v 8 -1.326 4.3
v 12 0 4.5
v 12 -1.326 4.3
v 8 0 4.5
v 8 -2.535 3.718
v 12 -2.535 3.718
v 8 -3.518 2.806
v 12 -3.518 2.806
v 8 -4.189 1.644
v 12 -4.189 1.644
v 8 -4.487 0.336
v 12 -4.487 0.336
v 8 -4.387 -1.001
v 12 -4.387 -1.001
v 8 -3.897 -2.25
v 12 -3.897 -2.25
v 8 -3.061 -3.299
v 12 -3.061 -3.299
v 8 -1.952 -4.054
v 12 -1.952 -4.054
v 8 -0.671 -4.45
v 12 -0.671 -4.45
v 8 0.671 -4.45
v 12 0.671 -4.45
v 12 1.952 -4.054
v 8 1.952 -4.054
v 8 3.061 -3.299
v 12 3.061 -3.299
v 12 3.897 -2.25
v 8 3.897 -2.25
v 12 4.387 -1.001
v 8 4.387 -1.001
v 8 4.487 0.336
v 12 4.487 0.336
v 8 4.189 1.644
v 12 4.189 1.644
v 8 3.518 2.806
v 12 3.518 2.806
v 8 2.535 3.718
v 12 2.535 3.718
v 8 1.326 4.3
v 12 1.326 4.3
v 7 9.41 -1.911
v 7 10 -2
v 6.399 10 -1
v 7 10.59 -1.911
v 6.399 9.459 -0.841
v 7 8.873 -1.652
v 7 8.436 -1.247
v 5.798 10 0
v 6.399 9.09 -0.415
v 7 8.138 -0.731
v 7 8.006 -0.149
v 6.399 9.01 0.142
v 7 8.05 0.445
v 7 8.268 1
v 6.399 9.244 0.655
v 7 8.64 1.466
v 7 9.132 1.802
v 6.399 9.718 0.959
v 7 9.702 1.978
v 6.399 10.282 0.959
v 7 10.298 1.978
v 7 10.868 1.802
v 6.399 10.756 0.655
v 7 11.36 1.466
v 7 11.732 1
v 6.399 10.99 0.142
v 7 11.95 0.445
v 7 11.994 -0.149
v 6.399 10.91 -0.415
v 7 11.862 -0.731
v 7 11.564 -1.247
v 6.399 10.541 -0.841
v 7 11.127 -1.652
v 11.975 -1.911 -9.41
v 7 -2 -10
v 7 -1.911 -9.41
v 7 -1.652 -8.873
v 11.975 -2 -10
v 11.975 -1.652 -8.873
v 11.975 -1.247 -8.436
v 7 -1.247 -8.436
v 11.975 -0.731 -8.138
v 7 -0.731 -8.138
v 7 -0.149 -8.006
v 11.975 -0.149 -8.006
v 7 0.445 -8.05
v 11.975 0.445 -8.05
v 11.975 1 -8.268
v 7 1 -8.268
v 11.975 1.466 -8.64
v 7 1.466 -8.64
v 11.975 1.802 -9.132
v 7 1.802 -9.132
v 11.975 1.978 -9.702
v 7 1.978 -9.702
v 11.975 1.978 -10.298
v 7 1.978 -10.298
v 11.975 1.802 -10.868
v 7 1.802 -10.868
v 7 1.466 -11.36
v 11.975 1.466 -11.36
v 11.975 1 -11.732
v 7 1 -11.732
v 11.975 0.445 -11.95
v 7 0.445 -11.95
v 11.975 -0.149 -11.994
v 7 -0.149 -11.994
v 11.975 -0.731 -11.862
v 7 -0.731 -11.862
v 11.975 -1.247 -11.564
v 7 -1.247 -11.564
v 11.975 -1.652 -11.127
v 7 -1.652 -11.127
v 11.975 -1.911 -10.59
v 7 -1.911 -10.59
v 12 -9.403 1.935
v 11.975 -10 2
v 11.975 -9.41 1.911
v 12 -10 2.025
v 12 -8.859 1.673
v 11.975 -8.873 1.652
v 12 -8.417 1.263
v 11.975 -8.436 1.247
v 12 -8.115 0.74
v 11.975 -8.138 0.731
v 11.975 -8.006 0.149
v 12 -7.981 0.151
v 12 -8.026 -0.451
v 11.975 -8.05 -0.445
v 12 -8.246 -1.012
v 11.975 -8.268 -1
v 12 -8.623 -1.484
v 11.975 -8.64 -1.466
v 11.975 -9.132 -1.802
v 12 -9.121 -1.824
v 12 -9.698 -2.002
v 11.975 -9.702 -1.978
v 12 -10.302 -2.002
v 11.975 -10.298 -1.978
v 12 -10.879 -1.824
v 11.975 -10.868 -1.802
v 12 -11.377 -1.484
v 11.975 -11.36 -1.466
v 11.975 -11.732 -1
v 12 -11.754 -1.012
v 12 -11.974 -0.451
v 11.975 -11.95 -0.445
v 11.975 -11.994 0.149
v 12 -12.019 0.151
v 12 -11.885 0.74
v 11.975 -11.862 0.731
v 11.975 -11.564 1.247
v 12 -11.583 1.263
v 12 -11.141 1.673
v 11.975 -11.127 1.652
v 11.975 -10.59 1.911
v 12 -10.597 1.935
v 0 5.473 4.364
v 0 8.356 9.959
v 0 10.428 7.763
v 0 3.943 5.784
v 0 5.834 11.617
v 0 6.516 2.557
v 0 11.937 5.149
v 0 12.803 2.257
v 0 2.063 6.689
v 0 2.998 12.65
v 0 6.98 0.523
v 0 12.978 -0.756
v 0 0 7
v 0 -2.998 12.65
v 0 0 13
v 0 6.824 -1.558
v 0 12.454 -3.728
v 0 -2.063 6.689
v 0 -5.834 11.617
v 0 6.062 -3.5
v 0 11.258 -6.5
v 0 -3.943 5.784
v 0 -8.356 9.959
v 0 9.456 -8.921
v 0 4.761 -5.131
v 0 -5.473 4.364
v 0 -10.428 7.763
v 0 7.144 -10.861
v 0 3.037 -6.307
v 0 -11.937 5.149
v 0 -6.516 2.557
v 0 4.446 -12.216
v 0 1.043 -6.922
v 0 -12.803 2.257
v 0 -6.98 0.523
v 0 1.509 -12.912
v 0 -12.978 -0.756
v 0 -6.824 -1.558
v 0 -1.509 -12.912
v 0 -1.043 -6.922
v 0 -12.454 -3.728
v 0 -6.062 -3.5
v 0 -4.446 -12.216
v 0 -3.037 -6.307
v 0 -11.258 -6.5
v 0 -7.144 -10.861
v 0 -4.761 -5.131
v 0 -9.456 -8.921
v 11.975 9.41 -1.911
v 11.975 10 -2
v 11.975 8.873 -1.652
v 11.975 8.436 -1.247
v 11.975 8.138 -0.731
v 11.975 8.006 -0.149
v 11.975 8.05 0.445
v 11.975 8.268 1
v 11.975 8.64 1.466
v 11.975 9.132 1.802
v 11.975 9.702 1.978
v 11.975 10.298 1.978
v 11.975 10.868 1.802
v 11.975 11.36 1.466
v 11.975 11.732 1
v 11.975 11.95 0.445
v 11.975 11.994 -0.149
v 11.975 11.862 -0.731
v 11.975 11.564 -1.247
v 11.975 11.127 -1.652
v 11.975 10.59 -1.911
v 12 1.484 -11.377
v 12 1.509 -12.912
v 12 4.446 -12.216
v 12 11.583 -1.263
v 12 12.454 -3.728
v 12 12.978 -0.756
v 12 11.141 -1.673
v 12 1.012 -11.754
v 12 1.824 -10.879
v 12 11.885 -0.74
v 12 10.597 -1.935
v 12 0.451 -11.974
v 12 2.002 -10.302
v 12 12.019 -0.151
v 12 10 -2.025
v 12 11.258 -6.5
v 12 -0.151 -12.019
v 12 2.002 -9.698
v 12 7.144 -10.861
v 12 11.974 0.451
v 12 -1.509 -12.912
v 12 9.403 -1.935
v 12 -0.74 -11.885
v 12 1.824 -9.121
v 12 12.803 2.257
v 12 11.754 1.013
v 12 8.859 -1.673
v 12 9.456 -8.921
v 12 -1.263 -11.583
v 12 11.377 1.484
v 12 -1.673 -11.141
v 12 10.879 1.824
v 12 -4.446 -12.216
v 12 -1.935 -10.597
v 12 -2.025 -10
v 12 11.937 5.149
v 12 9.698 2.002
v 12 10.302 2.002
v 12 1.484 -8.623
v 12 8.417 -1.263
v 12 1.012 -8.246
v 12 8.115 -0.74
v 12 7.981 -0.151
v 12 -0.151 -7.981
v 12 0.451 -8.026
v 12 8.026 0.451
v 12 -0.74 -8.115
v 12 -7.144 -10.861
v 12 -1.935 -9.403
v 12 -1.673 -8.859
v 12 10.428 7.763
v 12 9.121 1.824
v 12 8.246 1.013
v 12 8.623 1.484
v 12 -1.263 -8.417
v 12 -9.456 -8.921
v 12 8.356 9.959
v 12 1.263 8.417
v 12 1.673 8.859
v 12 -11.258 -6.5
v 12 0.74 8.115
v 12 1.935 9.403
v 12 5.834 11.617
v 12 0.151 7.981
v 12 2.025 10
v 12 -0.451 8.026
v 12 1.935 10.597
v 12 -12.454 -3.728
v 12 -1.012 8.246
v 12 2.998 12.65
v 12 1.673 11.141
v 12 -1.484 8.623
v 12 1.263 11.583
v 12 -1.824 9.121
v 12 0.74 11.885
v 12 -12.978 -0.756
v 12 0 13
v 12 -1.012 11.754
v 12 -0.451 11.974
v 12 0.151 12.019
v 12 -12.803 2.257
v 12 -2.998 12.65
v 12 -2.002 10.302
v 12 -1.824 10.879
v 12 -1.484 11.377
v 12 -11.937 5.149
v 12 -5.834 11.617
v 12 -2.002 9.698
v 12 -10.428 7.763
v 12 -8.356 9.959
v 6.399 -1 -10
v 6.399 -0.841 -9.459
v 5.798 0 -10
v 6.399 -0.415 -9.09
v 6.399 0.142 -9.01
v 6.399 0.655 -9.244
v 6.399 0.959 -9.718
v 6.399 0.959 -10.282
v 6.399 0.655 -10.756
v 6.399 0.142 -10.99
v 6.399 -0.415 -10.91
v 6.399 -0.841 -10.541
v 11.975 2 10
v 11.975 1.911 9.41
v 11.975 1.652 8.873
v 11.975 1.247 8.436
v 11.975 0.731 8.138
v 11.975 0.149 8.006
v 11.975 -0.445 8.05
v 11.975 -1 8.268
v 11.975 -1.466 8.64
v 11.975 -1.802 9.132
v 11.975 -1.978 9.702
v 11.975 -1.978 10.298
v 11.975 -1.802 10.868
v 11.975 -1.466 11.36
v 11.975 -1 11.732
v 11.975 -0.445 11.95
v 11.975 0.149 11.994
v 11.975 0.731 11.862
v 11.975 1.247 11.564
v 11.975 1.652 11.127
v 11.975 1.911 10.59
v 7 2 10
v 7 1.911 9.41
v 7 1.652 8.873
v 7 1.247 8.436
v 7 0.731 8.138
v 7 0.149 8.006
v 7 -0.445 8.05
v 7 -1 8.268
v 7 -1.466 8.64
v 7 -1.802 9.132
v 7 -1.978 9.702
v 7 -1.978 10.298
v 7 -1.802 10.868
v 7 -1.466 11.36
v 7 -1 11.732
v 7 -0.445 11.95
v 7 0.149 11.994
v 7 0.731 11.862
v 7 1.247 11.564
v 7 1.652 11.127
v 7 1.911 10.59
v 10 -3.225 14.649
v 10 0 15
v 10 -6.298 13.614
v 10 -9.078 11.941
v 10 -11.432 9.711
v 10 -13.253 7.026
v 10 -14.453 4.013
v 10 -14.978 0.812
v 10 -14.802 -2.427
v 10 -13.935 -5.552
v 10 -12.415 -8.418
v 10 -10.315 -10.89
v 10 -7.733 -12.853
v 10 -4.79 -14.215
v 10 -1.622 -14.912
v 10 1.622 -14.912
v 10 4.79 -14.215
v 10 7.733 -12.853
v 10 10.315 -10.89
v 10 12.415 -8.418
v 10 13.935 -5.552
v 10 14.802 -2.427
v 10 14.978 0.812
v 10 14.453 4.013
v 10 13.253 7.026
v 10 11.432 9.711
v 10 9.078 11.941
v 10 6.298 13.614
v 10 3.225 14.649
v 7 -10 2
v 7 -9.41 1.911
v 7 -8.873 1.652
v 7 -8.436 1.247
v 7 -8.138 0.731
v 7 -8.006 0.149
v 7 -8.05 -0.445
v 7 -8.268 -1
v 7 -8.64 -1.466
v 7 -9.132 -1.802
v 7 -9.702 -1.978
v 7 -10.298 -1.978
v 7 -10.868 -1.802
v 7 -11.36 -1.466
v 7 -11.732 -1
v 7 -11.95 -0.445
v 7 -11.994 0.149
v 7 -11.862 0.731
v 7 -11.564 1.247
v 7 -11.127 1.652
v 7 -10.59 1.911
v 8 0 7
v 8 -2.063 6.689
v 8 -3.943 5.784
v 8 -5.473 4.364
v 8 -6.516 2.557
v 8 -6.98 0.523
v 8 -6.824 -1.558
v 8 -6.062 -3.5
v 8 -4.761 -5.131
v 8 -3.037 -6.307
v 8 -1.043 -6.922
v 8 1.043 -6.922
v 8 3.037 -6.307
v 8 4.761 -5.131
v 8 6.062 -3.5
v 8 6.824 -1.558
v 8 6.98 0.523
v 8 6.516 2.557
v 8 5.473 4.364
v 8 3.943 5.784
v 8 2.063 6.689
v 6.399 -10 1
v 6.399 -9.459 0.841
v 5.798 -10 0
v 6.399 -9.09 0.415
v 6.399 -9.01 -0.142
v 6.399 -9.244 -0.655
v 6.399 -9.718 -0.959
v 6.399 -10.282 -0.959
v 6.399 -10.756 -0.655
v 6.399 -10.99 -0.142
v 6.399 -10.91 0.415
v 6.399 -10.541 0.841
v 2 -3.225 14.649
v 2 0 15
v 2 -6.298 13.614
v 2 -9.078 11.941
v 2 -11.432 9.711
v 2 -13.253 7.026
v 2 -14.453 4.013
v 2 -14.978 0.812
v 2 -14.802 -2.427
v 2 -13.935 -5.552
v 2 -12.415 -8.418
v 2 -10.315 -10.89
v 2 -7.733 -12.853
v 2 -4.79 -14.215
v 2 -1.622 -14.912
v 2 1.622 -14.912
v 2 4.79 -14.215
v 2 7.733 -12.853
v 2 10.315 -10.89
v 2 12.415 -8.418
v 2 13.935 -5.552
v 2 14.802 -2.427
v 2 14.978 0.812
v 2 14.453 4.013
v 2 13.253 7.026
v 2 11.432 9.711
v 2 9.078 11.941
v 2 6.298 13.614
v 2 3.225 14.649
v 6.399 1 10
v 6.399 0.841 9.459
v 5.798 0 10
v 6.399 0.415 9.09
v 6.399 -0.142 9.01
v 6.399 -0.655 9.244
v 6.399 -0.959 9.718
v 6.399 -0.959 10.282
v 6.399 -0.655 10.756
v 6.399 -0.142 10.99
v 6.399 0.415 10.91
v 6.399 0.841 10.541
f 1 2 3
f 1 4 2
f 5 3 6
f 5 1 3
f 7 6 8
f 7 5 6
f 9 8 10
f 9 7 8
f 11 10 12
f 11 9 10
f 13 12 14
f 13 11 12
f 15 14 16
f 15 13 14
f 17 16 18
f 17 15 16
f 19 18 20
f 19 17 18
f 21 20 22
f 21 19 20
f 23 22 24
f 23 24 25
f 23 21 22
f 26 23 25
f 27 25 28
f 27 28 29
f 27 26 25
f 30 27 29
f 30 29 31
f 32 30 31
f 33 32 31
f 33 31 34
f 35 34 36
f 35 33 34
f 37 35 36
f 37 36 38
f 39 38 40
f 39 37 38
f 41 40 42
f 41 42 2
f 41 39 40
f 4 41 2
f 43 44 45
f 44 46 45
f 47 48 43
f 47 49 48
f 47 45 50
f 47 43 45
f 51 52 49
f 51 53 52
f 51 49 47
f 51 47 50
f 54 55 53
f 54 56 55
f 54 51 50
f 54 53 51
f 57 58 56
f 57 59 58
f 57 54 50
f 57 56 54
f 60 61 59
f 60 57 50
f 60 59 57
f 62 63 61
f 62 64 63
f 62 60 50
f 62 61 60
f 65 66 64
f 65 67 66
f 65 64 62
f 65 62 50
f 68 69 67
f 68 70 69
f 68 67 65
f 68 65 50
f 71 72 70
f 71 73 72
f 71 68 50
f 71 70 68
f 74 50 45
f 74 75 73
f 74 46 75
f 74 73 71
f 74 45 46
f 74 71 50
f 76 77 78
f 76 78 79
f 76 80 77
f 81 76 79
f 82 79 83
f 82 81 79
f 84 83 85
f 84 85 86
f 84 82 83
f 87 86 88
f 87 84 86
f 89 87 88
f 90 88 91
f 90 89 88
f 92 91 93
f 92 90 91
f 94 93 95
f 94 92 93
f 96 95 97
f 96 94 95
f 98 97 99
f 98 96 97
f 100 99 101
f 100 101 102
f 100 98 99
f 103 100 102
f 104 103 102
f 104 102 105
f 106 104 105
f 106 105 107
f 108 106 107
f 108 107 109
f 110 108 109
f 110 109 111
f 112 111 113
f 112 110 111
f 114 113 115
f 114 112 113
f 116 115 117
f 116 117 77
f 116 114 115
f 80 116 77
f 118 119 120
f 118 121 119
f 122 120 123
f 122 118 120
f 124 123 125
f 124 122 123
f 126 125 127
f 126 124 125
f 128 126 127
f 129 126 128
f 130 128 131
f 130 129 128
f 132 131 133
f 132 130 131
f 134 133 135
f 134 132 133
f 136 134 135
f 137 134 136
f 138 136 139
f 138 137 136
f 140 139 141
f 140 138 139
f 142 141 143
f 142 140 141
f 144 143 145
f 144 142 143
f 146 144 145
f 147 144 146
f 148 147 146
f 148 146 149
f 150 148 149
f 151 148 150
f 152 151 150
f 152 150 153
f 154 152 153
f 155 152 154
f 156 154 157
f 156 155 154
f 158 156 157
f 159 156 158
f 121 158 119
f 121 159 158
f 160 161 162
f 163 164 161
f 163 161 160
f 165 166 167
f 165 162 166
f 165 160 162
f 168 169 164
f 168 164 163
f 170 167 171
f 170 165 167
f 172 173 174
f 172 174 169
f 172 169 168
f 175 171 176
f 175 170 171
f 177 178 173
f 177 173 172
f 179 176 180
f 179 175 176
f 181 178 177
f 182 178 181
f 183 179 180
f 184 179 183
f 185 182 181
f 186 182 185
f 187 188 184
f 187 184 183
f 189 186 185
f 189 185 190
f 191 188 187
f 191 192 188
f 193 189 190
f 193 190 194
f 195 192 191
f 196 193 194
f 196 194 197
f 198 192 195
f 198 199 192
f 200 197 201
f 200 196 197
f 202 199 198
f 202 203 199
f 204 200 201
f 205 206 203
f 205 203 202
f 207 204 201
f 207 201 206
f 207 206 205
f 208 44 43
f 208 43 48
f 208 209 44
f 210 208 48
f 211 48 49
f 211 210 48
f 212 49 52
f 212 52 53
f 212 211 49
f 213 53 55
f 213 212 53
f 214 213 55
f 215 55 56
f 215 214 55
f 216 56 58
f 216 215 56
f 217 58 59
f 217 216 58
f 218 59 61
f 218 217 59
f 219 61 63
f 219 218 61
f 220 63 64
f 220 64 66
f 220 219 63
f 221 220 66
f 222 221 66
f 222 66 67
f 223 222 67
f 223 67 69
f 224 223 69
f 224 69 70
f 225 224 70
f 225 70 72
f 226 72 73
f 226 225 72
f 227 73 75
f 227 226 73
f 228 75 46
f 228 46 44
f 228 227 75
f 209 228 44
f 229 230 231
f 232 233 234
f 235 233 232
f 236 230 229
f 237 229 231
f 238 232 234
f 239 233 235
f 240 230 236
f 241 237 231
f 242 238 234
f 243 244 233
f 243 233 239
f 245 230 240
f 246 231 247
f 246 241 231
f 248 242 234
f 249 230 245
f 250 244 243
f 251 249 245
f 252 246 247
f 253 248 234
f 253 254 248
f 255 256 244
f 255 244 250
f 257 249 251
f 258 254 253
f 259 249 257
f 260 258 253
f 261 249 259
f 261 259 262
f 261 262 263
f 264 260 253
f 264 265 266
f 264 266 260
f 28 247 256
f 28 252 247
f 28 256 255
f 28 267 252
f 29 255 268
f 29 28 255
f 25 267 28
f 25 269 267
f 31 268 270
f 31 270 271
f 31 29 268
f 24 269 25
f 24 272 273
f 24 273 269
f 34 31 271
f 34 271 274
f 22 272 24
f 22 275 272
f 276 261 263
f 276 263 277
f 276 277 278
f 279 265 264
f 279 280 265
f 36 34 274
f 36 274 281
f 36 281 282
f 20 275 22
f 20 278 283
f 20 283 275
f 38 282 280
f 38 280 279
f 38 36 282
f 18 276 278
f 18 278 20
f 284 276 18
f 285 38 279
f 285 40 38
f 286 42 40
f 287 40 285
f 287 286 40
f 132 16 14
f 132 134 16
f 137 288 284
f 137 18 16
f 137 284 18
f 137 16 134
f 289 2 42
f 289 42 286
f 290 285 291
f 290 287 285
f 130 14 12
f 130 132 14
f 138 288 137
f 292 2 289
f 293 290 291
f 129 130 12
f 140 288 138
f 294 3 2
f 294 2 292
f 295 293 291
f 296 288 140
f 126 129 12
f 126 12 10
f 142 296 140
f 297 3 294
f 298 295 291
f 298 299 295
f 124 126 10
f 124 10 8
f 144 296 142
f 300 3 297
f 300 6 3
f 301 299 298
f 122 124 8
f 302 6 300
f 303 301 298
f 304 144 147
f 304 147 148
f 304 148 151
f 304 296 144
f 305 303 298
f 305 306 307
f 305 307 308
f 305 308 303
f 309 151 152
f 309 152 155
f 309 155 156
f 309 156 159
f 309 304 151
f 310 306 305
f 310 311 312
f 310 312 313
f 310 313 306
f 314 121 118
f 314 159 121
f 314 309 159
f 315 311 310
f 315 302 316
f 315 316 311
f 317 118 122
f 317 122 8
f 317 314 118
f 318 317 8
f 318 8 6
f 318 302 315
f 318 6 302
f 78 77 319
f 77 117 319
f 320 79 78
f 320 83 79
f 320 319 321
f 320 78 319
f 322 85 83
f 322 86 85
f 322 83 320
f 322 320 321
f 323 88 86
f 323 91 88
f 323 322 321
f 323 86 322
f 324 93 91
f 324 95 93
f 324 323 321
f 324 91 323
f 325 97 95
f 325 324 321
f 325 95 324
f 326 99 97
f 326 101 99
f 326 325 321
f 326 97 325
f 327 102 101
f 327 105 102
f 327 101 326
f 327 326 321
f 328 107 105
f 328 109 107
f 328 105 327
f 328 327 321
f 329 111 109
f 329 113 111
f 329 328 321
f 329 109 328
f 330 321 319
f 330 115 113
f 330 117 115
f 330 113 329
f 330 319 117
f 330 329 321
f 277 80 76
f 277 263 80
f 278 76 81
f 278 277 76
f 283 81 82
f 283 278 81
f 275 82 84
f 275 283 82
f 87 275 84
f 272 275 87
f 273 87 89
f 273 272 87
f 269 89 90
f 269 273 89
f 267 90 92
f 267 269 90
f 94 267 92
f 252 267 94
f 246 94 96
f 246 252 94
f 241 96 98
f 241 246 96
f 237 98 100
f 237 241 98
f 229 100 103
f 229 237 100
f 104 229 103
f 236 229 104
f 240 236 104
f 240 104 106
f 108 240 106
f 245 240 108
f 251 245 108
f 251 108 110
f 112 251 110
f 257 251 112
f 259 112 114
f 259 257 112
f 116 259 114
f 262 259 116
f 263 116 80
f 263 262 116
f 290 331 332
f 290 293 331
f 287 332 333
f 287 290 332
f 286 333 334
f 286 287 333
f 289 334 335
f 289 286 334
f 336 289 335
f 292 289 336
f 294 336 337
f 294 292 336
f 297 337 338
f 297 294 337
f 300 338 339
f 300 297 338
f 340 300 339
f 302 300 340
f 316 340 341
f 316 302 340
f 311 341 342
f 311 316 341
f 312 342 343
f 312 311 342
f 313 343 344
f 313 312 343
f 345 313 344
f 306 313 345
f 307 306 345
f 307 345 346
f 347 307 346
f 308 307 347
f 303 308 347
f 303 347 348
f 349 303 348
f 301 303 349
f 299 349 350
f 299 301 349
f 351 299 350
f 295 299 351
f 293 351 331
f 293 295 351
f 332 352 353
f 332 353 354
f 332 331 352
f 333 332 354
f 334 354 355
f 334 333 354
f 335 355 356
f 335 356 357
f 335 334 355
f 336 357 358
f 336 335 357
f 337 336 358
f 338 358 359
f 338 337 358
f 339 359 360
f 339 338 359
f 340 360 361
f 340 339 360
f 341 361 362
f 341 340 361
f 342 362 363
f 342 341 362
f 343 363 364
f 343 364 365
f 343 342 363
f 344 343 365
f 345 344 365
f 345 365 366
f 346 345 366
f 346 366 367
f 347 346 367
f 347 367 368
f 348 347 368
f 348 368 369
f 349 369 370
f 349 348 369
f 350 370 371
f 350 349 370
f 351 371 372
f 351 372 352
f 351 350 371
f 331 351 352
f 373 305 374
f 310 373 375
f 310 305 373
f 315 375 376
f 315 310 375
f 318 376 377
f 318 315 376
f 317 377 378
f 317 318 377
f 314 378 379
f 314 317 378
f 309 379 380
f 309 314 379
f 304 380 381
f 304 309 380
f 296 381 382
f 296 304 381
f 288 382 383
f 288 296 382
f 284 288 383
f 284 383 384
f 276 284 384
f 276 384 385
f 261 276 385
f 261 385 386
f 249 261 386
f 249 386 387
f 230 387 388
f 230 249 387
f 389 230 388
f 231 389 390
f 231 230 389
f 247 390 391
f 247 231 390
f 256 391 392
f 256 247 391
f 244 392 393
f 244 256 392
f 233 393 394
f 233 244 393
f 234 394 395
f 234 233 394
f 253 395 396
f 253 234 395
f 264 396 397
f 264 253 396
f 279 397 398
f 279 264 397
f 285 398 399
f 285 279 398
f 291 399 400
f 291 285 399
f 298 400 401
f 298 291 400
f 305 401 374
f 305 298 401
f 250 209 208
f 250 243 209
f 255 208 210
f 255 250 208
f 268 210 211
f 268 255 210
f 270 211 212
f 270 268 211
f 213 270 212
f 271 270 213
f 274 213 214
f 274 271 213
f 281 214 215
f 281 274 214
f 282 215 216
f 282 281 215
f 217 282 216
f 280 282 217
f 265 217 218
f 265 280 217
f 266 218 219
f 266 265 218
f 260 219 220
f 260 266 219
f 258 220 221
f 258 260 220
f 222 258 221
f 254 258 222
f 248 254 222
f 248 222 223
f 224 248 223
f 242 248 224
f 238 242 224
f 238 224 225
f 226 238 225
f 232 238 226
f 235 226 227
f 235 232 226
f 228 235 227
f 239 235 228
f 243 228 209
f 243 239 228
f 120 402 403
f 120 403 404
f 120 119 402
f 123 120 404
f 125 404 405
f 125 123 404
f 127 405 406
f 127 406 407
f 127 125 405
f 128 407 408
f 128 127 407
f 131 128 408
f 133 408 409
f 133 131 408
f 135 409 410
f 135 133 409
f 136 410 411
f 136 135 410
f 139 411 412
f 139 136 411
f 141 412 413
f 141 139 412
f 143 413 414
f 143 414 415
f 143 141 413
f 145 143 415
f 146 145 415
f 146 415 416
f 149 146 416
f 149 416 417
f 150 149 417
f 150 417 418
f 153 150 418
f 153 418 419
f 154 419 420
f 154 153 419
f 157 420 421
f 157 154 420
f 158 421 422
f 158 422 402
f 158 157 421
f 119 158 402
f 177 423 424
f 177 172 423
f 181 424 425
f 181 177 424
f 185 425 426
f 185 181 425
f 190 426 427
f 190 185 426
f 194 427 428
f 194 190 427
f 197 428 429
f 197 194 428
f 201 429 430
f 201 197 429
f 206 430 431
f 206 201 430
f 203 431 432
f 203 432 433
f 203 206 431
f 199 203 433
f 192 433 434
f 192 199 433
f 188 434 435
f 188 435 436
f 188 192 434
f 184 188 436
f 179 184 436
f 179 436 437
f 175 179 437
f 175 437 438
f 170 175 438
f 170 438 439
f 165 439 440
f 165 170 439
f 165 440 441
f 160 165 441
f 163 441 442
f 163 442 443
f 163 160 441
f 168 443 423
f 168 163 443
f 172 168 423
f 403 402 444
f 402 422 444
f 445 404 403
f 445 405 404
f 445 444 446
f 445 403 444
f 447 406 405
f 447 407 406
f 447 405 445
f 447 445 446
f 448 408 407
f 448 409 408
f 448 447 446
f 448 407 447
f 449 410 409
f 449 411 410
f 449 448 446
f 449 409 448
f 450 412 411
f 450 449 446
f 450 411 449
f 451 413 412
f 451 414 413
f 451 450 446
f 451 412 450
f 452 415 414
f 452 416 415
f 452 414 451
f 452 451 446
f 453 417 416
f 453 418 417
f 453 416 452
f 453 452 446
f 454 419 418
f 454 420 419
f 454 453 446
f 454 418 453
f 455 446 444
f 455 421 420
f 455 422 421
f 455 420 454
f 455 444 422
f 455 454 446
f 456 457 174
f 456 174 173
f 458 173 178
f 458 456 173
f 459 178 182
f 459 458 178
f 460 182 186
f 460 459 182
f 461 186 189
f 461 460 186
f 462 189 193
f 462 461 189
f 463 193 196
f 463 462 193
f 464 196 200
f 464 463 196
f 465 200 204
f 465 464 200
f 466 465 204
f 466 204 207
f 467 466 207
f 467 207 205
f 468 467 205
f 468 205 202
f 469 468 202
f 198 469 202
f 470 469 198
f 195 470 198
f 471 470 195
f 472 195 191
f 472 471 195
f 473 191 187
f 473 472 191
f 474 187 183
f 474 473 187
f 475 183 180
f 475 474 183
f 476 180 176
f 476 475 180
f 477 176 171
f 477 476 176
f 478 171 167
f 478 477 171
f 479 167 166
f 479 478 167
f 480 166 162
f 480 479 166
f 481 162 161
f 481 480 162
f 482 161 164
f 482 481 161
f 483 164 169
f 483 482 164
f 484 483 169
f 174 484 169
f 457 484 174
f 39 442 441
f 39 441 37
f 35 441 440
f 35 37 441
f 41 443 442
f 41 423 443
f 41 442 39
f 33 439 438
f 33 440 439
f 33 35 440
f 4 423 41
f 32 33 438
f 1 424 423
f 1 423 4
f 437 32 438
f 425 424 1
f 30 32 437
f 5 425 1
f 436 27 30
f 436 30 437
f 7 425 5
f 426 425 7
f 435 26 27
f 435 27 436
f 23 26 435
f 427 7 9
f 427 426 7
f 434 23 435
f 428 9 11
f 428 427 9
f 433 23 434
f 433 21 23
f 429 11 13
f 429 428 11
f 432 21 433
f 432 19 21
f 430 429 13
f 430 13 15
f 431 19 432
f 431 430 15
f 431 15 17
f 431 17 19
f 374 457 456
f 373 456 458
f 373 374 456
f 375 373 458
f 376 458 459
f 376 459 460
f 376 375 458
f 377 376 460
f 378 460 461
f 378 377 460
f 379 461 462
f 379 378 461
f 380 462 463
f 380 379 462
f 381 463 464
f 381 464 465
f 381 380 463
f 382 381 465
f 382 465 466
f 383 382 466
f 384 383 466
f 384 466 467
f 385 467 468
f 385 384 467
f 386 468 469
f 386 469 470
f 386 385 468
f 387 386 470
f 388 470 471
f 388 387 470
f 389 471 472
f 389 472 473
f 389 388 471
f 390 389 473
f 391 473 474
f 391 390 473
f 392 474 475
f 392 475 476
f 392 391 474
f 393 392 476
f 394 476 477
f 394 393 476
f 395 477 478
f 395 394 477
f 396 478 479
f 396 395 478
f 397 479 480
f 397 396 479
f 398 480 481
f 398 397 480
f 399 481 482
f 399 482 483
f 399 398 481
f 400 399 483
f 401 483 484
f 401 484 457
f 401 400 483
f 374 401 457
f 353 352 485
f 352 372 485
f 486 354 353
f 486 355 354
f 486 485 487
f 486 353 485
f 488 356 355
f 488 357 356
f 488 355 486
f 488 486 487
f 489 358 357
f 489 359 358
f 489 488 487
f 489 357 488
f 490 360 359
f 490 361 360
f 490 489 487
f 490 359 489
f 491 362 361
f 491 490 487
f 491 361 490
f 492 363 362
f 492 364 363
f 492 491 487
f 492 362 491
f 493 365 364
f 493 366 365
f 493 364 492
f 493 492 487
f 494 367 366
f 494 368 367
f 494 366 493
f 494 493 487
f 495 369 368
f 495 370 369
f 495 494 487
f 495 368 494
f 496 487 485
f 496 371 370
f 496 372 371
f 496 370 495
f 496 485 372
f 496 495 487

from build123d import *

# Parameters (mm, degrees)
PATTERN_CIRCULAR_2_COUNT = 4
CHAMFER_1_SIZE           = 2


with BuildPart() as part:
    # Эскиз1 → Повернуть1 (revolve)
    with BuildSketch(Plane.XY, mode=Mode.PRIVATE) as revolve_1_sk:
        Polygon((0, 7), (0, 15), (12, 15), (12, 4.5), (8, 4.5), (8, 7), align=None)
    revolve(revolve_1_sk.sketch.rotate(Axis((0, 0, 0), (1, 0, 0)), 90), axis=Axis((0, 0, 0), (1, 0, 0)))

    # Эскиз3 → Отверстия под штифты Ø4.0 мм1 (revolve, cut)
    with BuildSketch(Plane(origin=(12, 10, 0), x_dir=(0, 0, -1), z_dir=(0, 1, 0))):
        Polygon((0, 0), (0, 6.201721238), (2, 5), (2, 0.025), (2.025, 0), align=None)
    hole_wizard_4_0_1 = revolve(axis=Axis((18.35, 10, 0), (-1, 0, 0)), mode=Mode.SUBTRACT)

    # Круговой массив2: Отверстия под штифты Ø4.0 мм1 ×4 about axis
    pattern_circular_2_axis = Axis((0, 0, 0), (1, 0, 0))
    for i in range(1, PATTERN_CIRCULAR_2_COUNT):
        add(hole_wizard_4_0_1.rotate(pattern_circular_2_axis, i * 360 / PATTERN_CIRCULAR_2_COUNT), mode=Mode.SUBTRACT)

    # Фаска1
    chamfer_1_edges = [part.edges().sort_by_distance(p)[0] for p in [
        (12, 0, -15),
        (0, 0, -15),
    ]]
    chamfer(chamfer_1_edges, length=CHAMFER_1_SIZE)


solid = part.part
